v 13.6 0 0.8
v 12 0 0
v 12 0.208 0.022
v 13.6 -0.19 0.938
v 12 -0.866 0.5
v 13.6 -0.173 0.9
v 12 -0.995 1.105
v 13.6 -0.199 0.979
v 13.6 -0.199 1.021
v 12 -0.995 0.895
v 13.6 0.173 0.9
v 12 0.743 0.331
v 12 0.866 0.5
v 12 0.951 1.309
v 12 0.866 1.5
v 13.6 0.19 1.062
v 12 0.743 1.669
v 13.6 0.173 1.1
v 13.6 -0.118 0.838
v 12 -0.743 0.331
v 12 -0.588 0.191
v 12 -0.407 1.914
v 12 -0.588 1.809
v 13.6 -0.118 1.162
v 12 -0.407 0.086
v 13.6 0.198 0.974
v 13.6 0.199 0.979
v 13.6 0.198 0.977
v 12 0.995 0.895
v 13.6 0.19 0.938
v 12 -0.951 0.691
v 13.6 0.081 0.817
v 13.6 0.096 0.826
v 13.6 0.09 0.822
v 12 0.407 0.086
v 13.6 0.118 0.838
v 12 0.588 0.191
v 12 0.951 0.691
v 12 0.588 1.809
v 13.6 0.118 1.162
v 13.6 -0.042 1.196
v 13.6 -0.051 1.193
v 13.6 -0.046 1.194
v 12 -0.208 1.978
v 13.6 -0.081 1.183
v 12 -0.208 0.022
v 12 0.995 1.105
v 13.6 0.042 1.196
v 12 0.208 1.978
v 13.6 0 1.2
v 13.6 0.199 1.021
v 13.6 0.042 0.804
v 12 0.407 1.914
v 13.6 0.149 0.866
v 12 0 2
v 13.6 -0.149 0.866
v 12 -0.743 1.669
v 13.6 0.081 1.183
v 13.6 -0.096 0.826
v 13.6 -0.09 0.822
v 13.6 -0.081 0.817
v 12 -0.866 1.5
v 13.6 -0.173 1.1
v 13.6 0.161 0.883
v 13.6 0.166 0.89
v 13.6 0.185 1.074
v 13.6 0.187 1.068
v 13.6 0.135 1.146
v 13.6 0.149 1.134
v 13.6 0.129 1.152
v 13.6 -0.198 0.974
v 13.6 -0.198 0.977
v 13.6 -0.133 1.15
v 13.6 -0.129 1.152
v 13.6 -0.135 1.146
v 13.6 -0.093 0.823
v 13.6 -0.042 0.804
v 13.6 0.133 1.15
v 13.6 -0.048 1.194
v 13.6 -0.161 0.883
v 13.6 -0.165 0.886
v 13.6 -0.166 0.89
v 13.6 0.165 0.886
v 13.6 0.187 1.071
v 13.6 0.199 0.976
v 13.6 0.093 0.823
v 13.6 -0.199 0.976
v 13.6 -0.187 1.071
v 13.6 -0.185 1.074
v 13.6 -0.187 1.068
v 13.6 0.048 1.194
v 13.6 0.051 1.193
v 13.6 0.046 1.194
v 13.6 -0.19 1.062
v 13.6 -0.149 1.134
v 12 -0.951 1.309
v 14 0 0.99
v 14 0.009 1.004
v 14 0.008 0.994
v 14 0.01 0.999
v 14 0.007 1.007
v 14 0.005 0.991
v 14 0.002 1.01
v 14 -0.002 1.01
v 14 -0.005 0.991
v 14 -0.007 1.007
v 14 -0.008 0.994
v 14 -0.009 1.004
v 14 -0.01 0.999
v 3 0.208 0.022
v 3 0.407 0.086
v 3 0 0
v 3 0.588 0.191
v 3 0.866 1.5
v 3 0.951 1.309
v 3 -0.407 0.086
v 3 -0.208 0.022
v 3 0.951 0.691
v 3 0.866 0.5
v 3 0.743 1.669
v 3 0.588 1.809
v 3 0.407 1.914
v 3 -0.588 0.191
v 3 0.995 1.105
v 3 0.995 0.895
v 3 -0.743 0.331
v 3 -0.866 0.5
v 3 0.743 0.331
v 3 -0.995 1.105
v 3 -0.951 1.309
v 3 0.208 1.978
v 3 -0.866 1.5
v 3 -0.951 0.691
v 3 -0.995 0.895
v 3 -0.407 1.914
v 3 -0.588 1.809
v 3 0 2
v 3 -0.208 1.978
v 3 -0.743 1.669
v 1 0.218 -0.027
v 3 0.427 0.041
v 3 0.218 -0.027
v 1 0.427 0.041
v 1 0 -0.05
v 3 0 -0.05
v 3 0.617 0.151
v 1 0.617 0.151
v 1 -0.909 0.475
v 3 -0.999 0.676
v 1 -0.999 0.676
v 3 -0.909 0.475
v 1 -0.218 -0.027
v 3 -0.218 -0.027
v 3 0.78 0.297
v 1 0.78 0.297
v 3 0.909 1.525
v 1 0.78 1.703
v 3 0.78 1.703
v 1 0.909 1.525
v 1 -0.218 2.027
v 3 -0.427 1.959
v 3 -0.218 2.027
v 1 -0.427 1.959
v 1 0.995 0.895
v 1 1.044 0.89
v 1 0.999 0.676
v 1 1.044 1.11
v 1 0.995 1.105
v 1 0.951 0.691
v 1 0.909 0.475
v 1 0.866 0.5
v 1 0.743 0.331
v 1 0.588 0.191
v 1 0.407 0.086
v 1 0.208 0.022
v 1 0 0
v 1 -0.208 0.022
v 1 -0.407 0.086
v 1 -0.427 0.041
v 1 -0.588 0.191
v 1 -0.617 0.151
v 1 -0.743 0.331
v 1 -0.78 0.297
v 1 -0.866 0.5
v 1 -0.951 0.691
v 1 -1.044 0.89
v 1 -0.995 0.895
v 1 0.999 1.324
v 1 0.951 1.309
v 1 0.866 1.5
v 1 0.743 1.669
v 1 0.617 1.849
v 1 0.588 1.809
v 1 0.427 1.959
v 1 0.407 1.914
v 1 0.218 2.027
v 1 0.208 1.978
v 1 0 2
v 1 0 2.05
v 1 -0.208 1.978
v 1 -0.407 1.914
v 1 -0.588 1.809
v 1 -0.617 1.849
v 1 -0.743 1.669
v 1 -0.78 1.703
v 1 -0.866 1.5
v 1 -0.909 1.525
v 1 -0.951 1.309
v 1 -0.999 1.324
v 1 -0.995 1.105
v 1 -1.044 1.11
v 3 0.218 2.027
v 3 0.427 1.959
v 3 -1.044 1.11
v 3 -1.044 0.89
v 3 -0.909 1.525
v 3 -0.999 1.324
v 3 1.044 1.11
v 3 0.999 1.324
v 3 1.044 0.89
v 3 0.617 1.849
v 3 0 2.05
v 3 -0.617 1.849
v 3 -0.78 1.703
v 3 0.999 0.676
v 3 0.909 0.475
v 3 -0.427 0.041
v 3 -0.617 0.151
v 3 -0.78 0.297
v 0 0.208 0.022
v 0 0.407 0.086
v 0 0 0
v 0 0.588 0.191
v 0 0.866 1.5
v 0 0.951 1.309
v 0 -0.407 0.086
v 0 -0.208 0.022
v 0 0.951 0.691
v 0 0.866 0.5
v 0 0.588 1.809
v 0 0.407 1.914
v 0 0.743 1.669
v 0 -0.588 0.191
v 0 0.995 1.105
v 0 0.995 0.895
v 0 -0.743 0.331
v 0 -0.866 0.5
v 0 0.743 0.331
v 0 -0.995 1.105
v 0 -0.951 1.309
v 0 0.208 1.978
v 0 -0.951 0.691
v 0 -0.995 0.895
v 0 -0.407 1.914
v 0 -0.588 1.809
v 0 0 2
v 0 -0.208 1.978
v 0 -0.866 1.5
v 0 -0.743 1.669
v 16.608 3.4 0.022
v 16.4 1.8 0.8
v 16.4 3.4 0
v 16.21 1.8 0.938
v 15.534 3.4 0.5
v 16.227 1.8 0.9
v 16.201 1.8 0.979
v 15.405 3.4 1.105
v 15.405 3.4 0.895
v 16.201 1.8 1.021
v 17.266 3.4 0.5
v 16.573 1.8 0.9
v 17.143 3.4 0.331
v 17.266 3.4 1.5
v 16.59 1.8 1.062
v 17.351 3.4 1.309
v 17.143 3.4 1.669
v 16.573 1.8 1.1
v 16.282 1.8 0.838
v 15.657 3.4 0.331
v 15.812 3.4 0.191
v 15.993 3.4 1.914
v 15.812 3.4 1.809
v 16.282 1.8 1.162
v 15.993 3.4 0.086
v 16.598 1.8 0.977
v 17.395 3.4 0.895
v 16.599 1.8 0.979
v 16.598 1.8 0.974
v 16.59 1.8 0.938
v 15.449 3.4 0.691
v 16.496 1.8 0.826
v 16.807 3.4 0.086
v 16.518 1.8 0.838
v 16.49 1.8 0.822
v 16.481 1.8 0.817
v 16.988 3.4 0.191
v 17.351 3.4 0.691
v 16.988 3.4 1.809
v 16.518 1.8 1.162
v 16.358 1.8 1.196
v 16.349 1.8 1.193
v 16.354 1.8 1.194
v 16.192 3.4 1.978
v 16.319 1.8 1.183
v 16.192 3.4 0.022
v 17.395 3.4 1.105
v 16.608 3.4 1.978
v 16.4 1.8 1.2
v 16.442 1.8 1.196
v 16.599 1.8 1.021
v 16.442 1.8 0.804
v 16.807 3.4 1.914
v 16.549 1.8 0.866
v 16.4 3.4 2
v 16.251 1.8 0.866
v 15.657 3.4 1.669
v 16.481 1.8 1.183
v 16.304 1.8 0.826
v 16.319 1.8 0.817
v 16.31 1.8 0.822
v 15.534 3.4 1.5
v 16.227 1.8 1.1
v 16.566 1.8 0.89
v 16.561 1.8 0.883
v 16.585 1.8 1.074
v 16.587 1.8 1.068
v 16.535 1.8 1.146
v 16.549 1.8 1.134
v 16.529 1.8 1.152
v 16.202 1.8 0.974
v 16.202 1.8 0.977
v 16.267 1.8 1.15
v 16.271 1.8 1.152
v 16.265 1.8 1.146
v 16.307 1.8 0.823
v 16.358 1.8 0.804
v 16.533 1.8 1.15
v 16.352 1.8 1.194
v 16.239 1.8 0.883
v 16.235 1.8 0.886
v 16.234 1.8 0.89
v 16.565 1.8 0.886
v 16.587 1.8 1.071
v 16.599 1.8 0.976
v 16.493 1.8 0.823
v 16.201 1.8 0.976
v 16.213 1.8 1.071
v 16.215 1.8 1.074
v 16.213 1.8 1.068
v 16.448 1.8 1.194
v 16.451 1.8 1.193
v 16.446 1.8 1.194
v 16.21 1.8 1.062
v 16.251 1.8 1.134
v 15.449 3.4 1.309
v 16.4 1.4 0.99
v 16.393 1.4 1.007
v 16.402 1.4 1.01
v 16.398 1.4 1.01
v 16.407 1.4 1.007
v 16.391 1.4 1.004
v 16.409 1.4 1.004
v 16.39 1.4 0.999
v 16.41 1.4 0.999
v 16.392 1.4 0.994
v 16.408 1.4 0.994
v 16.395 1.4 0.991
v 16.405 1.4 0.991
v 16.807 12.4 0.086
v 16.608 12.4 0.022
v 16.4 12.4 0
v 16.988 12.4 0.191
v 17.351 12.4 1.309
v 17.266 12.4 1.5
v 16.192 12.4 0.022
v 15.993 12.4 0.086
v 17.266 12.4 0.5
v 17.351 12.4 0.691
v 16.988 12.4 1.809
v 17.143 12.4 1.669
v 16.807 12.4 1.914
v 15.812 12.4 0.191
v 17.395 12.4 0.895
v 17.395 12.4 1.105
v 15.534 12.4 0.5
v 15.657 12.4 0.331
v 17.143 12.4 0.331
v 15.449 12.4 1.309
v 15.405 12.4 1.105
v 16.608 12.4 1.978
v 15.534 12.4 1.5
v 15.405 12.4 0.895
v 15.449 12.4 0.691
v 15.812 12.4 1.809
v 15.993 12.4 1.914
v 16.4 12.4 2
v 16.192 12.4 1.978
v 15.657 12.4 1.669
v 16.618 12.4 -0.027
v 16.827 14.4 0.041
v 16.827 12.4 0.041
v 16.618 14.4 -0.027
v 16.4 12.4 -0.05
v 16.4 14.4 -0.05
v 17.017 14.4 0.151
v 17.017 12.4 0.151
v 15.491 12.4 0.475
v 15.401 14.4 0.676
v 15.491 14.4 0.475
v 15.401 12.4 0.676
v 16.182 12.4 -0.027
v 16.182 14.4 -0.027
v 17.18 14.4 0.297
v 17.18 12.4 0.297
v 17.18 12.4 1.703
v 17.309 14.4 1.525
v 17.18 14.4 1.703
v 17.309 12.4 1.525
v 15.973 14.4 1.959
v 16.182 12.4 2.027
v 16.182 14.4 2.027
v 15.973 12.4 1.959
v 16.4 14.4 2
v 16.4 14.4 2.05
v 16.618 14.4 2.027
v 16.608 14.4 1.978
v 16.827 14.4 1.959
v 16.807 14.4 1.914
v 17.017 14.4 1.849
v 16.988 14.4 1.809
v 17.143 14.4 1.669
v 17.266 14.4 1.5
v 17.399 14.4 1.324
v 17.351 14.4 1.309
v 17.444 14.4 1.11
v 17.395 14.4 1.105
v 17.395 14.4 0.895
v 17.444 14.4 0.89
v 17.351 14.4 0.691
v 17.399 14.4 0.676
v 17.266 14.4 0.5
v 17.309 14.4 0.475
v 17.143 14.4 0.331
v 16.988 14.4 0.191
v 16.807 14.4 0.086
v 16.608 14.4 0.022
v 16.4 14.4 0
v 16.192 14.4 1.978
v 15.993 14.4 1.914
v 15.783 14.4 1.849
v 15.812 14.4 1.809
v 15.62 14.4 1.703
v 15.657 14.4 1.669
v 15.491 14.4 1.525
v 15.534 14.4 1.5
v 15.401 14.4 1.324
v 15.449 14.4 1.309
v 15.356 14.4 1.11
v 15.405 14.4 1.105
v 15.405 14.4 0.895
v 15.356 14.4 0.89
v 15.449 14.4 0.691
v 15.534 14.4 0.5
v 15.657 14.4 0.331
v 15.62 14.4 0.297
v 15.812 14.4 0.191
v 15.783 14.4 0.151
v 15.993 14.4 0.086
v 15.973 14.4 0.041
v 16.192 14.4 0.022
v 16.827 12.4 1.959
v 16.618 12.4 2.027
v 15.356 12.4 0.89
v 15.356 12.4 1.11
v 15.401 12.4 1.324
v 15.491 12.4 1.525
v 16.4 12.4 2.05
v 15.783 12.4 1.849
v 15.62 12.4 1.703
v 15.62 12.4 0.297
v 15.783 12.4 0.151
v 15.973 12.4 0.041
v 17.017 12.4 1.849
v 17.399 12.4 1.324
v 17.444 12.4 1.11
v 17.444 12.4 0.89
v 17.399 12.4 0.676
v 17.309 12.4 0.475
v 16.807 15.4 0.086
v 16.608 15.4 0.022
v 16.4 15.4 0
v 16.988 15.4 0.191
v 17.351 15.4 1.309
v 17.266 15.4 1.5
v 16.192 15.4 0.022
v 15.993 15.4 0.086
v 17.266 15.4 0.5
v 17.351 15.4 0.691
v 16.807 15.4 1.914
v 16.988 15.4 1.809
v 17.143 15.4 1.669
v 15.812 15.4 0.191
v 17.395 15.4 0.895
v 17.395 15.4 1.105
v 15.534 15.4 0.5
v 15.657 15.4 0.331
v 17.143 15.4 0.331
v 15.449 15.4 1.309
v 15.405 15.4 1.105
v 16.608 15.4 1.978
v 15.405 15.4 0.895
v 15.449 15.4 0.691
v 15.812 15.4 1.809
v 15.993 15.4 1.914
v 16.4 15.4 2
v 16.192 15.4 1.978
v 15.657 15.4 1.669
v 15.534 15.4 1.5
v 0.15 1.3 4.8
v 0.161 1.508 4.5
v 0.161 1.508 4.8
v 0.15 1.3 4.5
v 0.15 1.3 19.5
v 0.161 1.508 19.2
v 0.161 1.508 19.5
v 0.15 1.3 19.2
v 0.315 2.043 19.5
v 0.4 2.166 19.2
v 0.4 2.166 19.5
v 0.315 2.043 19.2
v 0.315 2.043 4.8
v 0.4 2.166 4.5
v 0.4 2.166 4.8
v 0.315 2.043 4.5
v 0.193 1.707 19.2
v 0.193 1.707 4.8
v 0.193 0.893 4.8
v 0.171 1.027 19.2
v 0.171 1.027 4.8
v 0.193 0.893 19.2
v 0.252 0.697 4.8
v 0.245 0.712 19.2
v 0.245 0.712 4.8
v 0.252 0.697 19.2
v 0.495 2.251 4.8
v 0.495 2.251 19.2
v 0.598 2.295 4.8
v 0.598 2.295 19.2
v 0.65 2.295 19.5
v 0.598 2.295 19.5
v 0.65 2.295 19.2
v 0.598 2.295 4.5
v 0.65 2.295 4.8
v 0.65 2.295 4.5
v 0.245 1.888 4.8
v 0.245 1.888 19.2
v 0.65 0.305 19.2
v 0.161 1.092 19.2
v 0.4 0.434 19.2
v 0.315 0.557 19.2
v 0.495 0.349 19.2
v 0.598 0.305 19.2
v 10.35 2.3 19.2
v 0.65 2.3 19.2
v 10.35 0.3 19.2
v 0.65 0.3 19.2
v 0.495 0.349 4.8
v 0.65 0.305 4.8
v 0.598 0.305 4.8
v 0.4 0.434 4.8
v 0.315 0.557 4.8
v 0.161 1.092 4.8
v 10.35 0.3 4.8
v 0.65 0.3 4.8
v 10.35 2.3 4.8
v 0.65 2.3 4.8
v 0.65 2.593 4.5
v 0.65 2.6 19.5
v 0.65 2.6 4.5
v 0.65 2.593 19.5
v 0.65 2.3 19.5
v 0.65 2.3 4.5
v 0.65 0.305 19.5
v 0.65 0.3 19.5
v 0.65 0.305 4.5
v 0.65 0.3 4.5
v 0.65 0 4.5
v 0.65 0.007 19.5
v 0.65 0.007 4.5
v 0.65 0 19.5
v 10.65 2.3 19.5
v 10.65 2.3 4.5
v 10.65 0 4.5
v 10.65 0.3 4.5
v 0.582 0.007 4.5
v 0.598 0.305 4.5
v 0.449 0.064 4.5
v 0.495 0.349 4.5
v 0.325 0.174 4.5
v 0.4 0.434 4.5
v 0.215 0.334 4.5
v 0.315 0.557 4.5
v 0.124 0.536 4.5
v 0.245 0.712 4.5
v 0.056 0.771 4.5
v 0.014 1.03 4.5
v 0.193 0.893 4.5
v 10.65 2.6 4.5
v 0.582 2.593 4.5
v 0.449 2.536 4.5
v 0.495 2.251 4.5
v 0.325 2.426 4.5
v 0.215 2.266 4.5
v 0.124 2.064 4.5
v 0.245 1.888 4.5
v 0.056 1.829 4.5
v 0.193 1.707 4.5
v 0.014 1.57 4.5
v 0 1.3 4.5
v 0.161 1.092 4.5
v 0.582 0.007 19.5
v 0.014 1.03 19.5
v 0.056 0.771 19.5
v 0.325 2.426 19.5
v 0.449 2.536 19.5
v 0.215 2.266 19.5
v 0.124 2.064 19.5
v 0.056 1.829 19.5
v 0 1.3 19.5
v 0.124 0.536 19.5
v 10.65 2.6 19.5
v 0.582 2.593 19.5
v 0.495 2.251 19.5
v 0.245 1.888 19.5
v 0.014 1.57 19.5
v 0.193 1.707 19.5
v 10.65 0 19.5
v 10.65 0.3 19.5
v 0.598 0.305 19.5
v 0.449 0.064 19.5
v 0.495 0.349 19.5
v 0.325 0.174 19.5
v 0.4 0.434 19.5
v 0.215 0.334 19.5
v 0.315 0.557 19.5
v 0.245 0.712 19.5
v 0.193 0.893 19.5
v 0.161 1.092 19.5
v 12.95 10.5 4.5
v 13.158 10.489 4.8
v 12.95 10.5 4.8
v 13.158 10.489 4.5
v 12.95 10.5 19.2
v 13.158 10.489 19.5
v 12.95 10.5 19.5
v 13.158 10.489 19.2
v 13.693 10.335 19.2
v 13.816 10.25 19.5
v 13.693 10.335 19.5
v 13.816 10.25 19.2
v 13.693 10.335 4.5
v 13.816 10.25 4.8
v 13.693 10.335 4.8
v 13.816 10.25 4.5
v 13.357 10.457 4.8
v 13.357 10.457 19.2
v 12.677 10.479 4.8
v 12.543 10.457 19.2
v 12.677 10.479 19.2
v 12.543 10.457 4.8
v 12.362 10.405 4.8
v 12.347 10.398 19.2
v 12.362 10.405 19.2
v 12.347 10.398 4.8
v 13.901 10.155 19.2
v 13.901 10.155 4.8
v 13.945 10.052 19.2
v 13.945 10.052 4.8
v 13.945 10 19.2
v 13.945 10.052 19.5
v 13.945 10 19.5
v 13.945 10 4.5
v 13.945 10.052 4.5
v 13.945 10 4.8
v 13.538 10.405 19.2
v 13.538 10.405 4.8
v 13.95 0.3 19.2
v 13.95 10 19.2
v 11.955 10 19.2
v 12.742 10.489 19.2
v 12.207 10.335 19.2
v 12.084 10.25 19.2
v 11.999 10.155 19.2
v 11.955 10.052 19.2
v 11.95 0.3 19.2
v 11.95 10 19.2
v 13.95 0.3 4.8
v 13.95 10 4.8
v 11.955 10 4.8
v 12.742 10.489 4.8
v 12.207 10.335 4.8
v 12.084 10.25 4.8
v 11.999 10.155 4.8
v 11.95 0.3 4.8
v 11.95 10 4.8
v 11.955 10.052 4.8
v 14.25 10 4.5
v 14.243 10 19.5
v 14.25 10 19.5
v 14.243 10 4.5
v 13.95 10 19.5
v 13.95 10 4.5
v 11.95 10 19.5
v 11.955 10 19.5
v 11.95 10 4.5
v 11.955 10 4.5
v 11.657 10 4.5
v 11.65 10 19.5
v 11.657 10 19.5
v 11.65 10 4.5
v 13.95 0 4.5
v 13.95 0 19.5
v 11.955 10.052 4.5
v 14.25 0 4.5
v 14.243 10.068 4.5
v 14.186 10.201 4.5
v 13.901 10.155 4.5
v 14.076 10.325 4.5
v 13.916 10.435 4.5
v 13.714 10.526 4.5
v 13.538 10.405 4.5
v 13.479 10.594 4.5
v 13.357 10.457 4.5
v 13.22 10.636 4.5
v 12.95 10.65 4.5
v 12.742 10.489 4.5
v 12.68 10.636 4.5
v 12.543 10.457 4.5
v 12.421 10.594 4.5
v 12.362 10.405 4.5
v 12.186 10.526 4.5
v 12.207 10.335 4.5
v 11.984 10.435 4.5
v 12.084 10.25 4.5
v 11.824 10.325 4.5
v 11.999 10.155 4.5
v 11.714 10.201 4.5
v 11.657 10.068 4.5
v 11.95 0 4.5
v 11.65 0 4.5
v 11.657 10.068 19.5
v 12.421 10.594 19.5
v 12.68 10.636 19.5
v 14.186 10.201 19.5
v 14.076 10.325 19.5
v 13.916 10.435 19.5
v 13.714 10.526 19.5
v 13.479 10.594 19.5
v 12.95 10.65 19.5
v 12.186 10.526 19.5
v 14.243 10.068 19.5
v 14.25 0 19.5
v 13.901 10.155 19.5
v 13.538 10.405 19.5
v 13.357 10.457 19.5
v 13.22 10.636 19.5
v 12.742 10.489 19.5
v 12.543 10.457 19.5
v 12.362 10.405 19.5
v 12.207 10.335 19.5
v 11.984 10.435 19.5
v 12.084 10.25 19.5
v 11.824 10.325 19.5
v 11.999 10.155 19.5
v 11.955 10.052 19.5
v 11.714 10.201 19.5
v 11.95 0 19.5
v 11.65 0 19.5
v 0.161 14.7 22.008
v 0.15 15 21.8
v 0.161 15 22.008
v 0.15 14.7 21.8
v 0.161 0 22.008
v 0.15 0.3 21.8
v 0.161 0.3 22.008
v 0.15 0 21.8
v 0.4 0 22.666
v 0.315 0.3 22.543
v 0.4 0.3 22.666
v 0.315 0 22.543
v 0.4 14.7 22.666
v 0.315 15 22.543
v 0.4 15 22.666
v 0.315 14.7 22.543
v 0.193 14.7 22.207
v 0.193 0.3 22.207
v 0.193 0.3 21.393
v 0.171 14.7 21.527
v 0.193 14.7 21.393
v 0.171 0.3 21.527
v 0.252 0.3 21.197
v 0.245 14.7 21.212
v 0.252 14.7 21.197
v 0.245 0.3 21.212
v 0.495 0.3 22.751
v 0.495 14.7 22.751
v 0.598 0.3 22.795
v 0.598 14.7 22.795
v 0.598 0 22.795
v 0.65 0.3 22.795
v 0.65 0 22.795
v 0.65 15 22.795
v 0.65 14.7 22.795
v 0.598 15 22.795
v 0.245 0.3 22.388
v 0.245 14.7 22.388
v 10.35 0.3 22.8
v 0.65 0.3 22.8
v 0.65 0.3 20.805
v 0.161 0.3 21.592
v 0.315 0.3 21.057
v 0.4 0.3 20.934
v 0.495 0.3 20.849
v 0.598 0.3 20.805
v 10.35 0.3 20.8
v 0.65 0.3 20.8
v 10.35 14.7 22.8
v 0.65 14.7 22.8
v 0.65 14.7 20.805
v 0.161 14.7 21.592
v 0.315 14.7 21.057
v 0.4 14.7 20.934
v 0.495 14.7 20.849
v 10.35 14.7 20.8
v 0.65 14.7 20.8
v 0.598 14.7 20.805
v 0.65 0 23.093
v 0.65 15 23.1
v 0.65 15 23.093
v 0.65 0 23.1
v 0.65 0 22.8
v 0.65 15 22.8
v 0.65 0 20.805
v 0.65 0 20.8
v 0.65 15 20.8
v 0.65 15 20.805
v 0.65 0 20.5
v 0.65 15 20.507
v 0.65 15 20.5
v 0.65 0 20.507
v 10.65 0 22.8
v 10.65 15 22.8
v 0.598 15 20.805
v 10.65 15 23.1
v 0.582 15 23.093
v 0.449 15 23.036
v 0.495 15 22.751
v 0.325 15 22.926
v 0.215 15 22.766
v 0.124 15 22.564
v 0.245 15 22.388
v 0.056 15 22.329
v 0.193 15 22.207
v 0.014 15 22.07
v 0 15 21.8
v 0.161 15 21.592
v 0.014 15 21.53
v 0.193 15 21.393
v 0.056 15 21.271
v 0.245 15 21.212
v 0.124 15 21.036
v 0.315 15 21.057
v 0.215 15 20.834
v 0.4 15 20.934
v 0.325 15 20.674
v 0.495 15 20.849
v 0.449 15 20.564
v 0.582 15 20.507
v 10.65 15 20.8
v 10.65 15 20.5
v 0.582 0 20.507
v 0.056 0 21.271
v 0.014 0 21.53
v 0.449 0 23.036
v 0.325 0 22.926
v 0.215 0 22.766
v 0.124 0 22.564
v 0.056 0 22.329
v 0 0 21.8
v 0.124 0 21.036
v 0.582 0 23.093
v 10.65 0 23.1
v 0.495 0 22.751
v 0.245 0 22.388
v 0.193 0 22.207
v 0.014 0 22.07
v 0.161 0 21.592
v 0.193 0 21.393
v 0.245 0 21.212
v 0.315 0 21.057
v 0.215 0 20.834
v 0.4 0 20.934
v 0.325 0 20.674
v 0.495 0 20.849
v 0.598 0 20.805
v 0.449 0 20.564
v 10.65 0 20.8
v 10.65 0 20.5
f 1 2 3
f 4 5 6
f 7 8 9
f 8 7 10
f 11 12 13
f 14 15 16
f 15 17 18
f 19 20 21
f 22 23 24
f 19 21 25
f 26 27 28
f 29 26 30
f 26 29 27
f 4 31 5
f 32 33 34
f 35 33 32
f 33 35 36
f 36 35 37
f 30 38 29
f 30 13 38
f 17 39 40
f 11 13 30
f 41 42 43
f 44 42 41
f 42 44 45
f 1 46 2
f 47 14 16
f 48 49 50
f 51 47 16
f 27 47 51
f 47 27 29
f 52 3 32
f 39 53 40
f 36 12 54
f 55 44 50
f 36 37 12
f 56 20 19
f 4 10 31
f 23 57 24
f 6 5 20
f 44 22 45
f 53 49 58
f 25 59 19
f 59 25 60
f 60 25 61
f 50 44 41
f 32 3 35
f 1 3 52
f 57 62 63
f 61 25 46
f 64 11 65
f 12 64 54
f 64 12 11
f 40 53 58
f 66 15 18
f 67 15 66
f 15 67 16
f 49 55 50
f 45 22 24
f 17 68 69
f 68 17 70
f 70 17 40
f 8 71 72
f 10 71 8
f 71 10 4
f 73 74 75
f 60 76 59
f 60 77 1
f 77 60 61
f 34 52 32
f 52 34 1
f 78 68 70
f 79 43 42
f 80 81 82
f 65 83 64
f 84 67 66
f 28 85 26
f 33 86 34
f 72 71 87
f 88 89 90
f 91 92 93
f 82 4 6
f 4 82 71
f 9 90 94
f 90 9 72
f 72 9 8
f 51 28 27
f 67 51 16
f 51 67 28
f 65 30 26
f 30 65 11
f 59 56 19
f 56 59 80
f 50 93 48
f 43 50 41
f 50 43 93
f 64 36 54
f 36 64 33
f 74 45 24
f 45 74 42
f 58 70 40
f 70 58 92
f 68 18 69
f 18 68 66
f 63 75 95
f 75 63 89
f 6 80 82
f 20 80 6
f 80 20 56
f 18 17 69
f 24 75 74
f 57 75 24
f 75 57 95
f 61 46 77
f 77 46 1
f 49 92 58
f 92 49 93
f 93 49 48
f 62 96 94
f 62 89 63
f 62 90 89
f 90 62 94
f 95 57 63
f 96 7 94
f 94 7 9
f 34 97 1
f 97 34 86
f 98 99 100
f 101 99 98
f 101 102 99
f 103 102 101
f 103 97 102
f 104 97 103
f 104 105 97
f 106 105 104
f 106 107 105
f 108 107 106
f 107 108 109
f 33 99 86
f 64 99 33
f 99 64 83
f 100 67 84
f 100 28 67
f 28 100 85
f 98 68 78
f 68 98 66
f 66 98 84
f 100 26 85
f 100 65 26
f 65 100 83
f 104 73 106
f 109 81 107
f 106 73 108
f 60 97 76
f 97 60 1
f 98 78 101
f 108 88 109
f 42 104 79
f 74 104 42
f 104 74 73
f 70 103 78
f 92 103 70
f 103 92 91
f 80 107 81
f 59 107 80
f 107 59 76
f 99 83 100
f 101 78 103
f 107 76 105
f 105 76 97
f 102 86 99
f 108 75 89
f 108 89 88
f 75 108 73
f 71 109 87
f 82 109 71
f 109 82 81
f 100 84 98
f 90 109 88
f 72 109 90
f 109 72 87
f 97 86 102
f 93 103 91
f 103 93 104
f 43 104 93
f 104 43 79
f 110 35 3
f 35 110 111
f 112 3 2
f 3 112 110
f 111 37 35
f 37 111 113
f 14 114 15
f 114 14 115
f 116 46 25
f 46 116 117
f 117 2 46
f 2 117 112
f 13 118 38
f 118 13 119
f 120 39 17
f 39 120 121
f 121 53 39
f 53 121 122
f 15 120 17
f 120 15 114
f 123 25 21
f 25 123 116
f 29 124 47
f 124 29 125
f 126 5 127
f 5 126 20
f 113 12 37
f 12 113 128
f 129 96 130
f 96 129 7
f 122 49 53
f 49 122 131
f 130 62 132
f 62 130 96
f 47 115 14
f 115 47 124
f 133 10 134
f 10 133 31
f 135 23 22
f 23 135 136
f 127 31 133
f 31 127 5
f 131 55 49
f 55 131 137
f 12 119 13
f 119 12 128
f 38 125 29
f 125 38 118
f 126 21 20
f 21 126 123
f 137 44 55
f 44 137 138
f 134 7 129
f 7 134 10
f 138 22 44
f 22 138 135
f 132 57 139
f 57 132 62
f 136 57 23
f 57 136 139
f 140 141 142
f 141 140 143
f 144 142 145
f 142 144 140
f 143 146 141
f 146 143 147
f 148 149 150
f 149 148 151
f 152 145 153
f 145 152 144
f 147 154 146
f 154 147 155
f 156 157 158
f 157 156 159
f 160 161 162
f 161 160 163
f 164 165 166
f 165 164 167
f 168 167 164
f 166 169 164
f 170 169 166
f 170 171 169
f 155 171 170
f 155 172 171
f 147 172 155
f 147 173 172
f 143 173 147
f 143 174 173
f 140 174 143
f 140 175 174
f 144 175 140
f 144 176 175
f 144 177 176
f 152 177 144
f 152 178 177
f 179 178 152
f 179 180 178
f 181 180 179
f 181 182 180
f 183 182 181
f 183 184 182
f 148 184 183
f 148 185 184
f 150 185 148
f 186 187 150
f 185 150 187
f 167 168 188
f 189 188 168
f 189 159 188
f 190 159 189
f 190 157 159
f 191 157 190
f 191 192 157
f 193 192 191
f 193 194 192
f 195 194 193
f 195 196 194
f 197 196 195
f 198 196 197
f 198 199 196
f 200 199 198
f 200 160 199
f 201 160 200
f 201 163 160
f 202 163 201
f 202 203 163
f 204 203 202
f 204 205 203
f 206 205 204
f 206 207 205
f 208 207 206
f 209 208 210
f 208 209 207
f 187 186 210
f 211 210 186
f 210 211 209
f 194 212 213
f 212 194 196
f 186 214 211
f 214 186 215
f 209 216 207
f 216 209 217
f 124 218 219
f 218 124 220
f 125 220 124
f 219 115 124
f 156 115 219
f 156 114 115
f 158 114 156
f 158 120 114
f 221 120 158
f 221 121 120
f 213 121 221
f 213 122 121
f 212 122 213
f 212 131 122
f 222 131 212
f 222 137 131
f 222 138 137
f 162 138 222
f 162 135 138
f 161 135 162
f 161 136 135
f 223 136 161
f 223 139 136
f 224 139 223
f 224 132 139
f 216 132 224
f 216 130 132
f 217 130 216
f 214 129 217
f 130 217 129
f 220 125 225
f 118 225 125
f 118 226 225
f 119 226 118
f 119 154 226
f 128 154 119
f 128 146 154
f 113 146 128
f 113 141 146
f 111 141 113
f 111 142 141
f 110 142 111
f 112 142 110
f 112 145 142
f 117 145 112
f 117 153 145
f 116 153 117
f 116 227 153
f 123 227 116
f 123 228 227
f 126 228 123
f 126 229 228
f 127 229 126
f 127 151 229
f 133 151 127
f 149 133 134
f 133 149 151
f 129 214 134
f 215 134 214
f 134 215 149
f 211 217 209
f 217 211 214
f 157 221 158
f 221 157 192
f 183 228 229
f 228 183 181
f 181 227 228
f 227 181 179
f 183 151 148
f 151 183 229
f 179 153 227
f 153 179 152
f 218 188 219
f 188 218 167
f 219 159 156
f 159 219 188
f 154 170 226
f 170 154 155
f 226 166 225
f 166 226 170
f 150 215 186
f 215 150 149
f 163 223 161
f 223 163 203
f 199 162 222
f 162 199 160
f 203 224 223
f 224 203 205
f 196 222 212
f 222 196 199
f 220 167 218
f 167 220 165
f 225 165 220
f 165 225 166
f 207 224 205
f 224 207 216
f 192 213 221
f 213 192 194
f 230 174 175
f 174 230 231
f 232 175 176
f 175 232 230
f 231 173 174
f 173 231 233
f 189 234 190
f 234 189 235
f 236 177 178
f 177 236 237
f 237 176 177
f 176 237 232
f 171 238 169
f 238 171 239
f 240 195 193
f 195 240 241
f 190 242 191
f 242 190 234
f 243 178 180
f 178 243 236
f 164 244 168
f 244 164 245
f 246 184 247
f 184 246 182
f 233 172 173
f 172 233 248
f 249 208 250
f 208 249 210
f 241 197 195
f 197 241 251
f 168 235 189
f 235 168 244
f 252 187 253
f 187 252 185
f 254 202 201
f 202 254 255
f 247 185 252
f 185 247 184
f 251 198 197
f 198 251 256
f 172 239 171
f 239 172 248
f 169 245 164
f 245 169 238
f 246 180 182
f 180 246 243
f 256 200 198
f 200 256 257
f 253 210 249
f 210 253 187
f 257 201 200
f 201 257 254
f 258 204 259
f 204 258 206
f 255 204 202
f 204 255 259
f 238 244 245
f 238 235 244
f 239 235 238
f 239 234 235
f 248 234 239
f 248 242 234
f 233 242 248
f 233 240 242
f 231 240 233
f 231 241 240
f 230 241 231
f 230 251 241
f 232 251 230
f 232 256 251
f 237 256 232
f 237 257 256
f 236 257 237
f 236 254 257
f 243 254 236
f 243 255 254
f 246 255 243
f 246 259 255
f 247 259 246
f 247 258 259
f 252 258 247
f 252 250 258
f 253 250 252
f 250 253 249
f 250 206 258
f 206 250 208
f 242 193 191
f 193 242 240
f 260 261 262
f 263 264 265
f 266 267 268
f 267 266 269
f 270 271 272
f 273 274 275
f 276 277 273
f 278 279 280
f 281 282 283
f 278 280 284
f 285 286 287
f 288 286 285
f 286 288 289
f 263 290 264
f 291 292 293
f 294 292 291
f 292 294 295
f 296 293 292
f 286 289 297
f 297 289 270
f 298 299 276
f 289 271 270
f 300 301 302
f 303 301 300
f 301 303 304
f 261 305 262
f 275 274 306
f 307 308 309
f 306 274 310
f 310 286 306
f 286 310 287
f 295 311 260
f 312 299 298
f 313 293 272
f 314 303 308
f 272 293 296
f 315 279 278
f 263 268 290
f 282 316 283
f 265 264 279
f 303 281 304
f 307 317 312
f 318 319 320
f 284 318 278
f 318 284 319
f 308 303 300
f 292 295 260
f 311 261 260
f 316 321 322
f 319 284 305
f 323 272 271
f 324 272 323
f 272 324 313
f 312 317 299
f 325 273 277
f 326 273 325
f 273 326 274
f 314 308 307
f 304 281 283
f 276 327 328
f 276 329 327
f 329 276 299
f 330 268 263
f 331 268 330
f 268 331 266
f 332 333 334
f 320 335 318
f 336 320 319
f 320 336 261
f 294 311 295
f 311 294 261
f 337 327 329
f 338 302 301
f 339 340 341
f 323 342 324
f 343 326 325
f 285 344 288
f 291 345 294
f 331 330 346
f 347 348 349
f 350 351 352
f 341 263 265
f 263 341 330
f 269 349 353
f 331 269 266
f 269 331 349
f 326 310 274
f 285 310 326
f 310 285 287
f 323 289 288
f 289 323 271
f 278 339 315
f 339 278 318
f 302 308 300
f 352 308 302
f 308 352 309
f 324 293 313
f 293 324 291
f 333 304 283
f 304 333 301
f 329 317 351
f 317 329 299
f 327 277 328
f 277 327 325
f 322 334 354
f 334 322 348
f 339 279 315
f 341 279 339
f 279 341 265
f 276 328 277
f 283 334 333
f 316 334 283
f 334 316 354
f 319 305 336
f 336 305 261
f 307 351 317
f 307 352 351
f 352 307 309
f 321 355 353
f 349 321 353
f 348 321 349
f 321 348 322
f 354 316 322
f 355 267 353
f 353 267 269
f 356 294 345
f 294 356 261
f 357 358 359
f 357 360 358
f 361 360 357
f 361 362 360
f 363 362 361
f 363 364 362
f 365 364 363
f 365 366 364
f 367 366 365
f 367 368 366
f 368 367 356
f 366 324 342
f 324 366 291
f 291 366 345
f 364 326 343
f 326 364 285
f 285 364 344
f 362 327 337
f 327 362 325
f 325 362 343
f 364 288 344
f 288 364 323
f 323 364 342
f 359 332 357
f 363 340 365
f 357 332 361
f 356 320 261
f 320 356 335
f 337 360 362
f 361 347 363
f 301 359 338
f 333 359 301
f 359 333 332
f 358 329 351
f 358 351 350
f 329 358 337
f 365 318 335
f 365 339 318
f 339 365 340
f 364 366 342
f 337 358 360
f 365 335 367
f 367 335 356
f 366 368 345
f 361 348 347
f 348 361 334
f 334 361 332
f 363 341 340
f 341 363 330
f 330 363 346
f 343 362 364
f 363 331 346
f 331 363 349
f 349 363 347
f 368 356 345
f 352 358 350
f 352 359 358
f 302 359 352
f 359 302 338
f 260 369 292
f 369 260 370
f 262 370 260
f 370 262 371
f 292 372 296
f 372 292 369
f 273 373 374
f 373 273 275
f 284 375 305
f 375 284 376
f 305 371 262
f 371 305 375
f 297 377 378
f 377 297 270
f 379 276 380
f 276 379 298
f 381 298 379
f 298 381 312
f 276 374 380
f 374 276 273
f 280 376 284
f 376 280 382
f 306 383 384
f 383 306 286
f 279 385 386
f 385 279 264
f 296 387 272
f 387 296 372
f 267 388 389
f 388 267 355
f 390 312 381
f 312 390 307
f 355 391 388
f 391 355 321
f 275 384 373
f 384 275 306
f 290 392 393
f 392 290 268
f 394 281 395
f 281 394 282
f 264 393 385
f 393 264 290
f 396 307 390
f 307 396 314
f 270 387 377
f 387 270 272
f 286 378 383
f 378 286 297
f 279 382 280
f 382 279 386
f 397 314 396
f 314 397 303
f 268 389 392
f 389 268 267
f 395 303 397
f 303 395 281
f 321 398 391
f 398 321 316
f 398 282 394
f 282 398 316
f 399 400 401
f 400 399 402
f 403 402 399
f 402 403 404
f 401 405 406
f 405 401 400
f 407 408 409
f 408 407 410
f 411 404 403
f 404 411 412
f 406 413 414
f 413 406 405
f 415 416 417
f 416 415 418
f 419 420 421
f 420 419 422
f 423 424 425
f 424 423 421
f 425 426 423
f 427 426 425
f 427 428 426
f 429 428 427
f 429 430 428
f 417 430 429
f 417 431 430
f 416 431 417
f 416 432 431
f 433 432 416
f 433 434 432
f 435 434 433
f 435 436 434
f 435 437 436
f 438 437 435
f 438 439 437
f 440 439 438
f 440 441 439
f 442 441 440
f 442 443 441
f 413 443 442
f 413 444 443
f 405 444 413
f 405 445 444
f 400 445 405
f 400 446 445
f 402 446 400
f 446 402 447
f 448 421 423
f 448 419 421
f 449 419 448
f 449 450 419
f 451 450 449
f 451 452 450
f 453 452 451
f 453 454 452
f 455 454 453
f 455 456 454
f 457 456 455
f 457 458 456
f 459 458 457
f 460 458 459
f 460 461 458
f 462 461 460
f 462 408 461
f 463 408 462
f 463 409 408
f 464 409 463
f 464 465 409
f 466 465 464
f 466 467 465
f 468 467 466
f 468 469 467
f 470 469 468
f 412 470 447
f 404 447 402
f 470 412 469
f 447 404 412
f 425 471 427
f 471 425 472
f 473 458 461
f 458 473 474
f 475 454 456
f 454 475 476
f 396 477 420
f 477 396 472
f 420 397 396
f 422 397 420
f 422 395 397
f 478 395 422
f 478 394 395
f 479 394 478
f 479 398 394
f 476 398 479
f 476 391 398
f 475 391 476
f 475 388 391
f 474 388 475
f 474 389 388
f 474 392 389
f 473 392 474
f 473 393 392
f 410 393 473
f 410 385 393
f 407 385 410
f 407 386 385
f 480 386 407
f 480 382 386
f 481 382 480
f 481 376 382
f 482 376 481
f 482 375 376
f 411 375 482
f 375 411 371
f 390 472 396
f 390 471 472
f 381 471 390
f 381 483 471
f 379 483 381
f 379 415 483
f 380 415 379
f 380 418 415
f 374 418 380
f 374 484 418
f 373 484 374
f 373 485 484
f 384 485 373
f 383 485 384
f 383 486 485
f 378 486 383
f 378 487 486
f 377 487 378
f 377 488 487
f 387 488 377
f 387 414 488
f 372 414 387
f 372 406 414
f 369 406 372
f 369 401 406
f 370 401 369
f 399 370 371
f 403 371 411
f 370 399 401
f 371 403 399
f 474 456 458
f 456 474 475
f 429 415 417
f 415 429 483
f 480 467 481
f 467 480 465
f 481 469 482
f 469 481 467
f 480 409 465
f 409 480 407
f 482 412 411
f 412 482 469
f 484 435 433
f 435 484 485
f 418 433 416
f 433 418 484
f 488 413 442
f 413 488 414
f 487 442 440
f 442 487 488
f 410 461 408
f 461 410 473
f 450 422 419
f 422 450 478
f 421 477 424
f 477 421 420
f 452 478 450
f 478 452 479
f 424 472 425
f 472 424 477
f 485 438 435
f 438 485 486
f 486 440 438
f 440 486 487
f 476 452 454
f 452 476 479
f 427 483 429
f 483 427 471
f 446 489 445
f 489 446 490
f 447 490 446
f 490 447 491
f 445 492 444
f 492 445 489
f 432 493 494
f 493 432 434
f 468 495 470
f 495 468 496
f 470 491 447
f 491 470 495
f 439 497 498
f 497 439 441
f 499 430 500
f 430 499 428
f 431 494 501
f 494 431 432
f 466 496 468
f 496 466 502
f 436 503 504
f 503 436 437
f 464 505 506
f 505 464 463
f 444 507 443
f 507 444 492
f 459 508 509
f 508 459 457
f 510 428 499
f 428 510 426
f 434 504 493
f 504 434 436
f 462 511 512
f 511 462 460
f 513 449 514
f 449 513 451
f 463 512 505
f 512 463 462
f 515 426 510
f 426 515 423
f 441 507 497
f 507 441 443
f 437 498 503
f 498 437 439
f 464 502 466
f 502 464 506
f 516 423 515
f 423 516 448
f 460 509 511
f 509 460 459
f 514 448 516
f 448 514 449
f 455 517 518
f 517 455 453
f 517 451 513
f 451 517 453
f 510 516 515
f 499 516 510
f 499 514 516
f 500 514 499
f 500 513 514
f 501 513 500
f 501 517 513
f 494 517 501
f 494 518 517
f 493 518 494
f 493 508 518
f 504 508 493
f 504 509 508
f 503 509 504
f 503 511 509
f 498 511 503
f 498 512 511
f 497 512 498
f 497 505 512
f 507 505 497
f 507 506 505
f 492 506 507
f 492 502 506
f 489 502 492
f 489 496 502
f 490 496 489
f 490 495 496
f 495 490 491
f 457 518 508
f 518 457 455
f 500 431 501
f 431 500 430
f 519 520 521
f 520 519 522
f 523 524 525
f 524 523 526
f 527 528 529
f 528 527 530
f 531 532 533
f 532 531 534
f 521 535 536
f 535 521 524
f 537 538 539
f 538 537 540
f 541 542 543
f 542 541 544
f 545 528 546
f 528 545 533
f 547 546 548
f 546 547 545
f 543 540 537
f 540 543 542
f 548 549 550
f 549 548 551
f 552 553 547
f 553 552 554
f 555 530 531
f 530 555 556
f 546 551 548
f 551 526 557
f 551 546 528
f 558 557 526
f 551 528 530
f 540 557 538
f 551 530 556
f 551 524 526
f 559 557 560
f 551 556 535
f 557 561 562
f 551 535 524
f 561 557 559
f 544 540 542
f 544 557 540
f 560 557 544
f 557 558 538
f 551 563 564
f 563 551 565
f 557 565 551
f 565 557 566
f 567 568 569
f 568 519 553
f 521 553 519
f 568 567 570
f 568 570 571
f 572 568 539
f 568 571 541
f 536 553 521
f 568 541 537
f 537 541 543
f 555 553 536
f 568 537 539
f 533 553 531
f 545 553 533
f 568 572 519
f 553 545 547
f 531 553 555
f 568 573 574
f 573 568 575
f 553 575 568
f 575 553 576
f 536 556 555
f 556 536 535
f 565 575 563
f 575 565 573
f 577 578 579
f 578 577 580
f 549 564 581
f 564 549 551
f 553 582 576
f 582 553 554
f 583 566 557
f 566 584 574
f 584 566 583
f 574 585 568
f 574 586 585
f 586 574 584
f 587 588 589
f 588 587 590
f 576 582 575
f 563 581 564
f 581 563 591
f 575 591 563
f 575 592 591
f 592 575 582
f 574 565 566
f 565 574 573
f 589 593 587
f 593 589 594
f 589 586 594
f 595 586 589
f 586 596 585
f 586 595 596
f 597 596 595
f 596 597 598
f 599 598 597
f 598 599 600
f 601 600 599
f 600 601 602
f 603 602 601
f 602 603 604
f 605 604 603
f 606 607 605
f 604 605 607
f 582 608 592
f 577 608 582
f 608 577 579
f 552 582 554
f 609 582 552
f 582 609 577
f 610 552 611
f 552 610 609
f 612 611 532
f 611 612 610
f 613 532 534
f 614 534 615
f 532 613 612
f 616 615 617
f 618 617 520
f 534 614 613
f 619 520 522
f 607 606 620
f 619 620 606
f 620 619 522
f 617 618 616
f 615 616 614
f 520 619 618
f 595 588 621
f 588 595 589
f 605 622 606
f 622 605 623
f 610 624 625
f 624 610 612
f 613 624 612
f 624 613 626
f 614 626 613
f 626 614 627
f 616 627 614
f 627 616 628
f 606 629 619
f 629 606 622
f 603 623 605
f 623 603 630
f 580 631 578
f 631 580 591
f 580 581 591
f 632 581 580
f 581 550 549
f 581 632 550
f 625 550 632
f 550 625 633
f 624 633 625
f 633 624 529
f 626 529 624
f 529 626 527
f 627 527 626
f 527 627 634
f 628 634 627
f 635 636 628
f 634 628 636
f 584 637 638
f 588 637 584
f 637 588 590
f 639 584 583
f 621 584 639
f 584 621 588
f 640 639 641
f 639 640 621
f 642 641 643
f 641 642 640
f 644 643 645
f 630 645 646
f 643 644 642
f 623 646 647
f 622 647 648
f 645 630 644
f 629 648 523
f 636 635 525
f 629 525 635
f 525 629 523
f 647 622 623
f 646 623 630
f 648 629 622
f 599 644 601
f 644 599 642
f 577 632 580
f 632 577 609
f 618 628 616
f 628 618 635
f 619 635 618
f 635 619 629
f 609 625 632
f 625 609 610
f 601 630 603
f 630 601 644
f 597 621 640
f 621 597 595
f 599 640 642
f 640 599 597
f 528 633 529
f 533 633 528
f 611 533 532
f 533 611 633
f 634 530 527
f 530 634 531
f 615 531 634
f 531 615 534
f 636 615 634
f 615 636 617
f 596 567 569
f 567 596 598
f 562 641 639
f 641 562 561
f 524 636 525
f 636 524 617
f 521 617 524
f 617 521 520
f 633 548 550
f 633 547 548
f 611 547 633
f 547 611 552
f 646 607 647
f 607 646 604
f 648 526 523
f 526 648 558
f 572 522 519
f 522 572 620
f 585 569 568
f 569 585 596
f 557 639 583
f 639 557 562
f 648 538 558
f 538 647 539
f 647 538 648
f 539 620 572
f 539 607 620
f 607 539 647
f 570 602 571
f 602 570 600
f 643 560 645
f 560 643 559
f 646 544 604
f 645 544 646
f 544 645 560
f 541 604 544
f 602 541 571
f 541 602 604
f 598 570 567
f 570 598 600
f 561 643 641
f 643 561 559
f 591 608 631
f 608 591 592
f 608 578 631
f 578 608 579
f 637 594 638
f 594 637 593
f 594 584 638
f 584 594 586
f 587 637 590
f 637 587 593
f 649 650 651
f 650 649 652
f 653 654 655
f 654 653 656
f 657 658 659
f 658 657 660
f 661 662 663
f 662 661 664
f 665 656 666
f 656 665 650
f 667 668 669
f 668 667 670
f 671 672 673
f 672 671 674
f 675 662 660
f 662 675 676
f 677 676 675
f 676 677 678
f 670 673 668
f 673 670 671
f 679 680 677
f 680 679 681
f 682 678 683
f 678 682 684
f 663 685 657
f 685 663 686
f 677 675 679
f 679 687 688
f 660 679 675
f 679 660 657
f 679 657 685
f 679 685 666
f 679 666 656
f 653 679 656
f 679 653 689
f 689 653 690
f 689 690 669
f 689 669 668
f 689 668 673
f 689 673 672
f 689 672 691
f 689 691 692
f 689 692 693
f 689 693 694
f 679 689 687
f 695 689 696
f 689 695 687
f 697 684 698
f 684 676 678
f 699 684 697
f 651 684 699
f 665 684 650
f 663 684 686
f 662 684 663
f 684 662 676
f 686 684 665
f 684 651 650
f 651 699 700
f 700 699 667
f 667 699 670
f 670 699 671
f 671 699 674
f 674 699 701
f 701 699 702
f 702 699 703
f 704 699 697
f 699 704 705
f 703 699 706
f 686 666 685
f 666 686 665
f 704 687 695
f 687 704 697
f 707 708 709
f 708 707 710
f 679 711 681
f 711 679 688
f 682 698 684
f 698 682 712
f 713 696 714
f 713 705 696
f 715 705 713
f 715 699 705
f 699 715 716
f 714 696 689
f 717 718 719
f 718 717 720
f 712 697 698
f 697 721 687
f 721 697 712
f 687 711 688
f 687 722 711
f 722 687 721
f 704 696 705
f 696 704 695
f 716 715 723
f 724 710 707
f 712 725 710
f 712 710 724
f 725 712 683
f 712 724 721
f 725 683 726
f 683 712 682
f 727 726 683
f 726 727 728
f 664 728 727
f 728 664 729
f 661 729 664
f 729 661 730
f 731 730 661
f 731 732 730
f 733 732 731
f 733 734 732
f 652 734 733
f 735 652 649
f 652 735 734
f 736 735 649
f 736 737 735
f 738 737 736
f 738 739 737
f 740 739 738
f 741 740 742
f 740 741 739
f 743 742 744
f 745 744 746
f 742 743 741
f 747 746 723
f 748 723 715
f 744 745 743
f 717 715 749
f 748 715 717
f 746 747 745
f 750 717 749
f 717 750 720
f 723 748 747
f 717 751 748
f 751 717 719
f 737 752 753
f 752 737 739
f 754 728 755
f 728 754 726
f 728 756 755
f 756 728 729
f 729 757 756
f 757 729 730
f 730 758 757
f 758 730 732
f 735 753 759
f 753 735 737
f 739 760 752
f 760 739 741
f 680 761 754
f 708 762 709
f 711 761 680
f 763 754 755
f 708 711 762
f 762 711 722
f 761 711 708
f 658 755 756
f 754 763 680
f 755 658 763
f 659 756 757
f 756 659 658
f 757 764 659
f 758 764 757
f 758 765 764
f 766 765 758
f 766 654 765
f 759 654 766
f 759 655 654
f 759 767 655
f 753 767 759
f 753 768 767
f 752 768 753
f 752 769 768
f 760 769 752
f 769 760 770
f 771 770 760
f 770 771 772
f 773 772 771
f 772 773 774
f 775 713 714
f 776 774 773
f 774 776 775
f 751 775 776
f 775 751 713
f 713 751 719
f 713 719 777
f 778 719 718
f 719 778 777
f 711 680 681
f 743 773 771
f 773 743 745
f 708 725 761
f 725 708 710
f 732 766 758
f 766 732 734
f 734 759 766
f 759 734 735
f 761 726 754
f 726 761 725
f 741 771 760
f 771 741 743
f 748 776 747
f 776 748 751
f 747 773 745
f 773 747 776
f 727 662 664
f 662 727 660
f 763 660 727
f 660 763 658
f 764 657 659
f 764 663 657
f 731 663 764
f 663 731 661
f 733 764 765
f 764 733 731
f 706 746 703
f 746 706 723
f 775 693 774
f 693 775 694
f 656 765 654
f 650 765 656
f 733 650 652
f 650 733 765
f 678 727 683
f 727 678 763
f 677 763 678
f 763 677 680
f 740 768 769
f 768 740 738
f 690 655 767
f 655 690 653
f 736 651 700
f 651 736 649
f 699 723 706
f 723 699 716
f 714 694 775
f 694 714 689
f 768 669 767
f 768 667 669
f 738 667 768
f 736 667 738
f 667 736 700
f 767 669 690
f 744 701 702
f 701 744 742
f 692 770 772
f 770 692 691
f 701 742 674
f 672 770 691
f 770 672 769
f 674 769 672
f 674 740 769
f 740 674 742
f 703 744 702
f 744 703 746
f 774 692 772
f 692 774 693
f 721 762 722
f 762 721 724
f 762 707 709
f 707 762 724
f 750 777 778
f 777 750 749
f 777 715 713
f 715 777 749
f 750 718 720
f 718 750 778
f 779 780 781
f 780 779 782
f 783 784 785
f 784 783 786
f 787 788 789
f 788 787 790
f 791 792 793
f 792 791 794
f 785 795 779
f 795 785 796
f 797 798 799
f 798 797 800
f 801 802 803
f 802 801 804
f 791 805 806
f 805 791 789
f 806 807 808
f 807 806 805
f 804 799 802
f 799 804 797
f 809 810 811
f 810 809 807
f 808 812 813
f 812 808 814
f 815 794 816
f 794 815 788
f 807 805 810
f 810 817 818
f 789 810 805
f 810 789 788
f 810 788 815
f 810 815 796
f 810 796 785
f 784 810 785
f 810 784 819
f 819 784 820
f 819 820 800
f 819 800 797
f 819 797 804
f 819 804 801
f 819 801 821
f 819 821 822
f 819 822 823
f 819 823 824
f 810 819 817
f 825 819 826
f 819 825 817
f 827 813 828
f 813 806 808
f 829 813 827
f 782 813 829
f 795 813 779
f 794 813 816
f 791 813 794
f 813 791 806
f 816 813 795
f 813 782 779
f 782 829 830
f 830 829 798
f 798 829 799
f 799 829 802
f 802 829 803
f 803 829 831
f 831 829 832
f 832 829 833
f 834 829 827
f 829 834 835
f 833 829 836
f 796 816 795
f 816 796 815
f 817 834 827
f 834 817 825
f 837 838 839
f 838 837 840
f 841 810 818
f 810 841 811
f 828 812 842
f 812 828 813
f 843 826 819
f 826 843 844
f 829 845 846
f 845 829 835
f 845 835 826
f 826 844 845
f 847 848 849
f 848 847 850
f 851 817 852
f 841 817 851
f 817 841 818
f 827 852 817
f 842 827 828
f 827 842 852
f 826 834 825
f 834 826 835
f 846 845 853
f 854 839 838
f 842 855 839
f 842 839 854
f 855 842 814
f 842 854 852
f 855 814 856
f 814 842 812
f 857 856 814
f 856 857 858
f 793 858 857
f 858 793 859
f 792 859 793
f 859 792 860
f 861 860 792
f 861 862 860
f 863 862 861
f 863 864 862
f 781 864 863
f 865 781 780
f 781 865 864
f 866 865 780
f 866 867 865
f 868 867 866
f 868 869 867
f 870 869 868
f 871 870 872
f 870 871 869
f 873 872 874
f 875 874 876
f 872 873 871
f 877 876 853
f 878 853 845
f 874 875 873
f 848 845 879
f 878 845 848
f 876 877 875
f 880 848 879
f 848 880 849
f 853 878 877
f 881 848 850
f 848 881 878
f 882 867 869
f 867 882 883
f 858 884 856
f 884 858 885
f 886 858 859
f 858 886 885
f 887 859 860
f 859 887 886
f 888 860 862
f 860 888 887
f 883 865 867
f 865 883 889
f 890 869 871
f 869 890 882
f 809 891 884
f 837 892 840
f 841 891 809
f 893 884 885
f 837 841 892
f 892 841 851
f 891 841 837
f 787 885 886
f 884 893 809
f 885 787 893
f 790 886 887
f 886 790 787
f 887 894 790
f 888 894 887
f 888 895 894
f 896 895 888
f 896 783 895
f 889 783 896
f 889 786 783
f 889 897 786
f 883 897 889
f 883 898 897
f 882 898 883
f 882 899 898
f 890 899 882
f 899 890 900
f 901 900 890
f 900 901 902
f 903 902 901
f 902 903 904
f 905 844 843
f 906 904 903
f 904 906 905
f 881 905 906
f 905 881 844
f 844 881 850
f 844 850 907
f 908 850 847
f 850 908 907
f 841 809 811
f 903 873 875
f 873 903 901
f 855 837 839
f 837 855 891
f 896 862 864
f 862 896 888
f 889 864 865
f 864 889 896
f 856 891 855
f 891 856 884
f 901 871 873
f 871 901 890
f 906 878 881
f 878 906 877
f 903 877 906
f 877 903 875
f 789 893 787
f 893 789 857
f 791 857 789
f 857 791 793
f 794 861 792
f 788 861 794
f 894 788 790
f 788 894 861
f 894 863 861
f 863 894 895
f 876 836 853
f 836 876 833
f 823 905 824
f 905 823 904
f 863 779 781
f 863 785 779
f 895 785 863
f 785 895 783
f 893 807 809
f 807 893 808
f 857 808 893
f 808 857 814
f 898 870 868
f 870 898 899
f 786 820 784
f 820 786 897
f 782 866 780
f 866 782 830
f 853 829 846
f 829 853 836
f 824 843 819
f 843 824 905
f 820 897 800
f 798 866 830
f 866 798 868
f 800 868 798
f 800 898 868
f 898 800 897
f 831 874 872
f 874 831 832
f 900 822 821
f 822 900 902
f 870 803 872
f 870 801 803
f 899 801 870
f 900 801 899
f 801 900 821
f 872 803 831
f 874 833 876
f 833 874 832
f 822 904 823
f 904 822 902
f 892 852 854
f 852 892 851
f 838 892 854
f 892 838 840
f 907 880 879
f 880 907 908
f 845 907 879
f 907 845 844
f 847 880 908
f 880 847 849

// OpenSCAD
// file: view-book-third-angle.scad
// Example third-angle
//cmdline: --projection=o --imgsize=400,400

use <../common/labeling.scad>

$vpt=[ 6.15, 1.76, 9.38 ];
$vpr=[ 90.00, 0.00, 0.00 ];
$vpd=50.44;
$vpf=22.50;

$fs=0.1;

coverWidth=10;
coverHeight=15;
coverThickness=0.3;

pagesInset=0.3;
pagesHeight=coverHeight - pagesInset*2;
pagesWidth=coverWidth - pagesInset;
pagesThickness=2;

bookThickness=coverThickness*2 + pagesThickness;

module coverColor() {
    color("#0000dd") children();
}

module textColor() {
    color("#66aa66") children();
}

module pagesColor() {
    color("#ffffee") children();
}

module cover() {
    coverColor() cube([coverWidth,coverThickness,coverHeight]);
}

module pages() {
    pagesColor() union() {
        translate([0,pagesThickness/2]) scale([0.5,1,1]) cylinder(h=pagesHeight, r=pagesThickness/2);
        cube([pagesWidth, pagesThickness, pagesHeight]);
    }
}

module spine() {
    coverColor() scale([0.5,1,1]) difference() {
        cylinder(h=coverHeight, r=bookThickness/2);
        translate([0,0,-0.01]) cylinder(h=coverHeight+0.02, r=pagesThickness/2);
        translate([0, -(bookThickness/2 + 0.1), -0.1]) cube([bookThickness + 0.2, bookThickness + 0.2, coverHeight+0.2]);
    }
}

module book() {
    cover();
    translate([0,coverThickness]) {
        translate([0, 0, pagesInset]) pages();
        translate([0, pagesThickness/2]) spine();
        translate([0,pagesThickness]) cover();
    }

    textColor() {
        translate([coverWidth/2, 0.4, coverHeight/2]) rotate([90, 0, 0]) text("front", size=2, halign="center");
        translate([coverWidth/2, bookThickness/2, coverHeight-0.6]) text("top", size=1, halign="center", valign="center");
        translate([coverWidth-0.6, bookThickness/2, coverHeight/2]) rotate([0, 90, 0]) text("right", size=1, halign="center", valign="center");
    }
}

thirdAngle([coverWidth, bookThickness, coverHeight]) {
    book();
    
    union() {}
    
    union() {}
    
    union() {}
}
// main file
// Example of a key
//cmdline: --projection=o --imgsize=600,400

use <view-book-third-angle.scad>
use <../common/labeling.scad>

$vpt=[ 4.05, 1.57, 12.00 ];
$vpr=[ 90.00, 0.00, 0.00 ];
$vpd=68.11;
$vpf=22.50;

$fs=0.1;

pencilRadius = 1;
eraserLength = 2;
bodyLength = 10;
pointLength = 2;
leadRatio = 0.2;
pencilLength = eraserLength + bodyLength + pointLength;

module pencil() {
    //eraser
    rotate([0, 90, 0]) {
        color("#ffdddd") cylinder(h=eraserLength, r=pencilRadius);
        translate([0, 0, eraserLength]) {
            //main body
            color("#ffff55") cylinder(h=bodyLength, r=pencilRadius);
            //ferrule
            color("#cccccc") cylinder(h=eraserLength, r=pencilRadius*1.05, center=true);
            translate([0, 0, bodyLength]) {
                //wood point
                color("#bbaa66") cylinder(h=pointLength * (1-leadRatio), r1=pencilRadius, r2=pencilRadius * leadRatio);
                color("#333333") translate([0, 0, pointLength * (1-leadRatio)]) cylinder(h=pointLength * leadRatio, r1=pencilRadius * leadRatio, r2=0.01);
            }
        }
    }
}

key([keyChildInfo("PENCIL", 3, pencilRadius, pencilRadius),
     keyChildInfo("BOOK", 1, 5, 10)]) {
         thirdAngle([pencilLength*1.1, pencilRadius*2, pencilRadius*2]) {
             pencil();
             union() {} union() {} // no labels for this example
         }
         translate([0.65, 0, -7.5]) thirdAngle([10, 5, 15]) {
             book();
             union() {} union() {} union() {}
         }
}
